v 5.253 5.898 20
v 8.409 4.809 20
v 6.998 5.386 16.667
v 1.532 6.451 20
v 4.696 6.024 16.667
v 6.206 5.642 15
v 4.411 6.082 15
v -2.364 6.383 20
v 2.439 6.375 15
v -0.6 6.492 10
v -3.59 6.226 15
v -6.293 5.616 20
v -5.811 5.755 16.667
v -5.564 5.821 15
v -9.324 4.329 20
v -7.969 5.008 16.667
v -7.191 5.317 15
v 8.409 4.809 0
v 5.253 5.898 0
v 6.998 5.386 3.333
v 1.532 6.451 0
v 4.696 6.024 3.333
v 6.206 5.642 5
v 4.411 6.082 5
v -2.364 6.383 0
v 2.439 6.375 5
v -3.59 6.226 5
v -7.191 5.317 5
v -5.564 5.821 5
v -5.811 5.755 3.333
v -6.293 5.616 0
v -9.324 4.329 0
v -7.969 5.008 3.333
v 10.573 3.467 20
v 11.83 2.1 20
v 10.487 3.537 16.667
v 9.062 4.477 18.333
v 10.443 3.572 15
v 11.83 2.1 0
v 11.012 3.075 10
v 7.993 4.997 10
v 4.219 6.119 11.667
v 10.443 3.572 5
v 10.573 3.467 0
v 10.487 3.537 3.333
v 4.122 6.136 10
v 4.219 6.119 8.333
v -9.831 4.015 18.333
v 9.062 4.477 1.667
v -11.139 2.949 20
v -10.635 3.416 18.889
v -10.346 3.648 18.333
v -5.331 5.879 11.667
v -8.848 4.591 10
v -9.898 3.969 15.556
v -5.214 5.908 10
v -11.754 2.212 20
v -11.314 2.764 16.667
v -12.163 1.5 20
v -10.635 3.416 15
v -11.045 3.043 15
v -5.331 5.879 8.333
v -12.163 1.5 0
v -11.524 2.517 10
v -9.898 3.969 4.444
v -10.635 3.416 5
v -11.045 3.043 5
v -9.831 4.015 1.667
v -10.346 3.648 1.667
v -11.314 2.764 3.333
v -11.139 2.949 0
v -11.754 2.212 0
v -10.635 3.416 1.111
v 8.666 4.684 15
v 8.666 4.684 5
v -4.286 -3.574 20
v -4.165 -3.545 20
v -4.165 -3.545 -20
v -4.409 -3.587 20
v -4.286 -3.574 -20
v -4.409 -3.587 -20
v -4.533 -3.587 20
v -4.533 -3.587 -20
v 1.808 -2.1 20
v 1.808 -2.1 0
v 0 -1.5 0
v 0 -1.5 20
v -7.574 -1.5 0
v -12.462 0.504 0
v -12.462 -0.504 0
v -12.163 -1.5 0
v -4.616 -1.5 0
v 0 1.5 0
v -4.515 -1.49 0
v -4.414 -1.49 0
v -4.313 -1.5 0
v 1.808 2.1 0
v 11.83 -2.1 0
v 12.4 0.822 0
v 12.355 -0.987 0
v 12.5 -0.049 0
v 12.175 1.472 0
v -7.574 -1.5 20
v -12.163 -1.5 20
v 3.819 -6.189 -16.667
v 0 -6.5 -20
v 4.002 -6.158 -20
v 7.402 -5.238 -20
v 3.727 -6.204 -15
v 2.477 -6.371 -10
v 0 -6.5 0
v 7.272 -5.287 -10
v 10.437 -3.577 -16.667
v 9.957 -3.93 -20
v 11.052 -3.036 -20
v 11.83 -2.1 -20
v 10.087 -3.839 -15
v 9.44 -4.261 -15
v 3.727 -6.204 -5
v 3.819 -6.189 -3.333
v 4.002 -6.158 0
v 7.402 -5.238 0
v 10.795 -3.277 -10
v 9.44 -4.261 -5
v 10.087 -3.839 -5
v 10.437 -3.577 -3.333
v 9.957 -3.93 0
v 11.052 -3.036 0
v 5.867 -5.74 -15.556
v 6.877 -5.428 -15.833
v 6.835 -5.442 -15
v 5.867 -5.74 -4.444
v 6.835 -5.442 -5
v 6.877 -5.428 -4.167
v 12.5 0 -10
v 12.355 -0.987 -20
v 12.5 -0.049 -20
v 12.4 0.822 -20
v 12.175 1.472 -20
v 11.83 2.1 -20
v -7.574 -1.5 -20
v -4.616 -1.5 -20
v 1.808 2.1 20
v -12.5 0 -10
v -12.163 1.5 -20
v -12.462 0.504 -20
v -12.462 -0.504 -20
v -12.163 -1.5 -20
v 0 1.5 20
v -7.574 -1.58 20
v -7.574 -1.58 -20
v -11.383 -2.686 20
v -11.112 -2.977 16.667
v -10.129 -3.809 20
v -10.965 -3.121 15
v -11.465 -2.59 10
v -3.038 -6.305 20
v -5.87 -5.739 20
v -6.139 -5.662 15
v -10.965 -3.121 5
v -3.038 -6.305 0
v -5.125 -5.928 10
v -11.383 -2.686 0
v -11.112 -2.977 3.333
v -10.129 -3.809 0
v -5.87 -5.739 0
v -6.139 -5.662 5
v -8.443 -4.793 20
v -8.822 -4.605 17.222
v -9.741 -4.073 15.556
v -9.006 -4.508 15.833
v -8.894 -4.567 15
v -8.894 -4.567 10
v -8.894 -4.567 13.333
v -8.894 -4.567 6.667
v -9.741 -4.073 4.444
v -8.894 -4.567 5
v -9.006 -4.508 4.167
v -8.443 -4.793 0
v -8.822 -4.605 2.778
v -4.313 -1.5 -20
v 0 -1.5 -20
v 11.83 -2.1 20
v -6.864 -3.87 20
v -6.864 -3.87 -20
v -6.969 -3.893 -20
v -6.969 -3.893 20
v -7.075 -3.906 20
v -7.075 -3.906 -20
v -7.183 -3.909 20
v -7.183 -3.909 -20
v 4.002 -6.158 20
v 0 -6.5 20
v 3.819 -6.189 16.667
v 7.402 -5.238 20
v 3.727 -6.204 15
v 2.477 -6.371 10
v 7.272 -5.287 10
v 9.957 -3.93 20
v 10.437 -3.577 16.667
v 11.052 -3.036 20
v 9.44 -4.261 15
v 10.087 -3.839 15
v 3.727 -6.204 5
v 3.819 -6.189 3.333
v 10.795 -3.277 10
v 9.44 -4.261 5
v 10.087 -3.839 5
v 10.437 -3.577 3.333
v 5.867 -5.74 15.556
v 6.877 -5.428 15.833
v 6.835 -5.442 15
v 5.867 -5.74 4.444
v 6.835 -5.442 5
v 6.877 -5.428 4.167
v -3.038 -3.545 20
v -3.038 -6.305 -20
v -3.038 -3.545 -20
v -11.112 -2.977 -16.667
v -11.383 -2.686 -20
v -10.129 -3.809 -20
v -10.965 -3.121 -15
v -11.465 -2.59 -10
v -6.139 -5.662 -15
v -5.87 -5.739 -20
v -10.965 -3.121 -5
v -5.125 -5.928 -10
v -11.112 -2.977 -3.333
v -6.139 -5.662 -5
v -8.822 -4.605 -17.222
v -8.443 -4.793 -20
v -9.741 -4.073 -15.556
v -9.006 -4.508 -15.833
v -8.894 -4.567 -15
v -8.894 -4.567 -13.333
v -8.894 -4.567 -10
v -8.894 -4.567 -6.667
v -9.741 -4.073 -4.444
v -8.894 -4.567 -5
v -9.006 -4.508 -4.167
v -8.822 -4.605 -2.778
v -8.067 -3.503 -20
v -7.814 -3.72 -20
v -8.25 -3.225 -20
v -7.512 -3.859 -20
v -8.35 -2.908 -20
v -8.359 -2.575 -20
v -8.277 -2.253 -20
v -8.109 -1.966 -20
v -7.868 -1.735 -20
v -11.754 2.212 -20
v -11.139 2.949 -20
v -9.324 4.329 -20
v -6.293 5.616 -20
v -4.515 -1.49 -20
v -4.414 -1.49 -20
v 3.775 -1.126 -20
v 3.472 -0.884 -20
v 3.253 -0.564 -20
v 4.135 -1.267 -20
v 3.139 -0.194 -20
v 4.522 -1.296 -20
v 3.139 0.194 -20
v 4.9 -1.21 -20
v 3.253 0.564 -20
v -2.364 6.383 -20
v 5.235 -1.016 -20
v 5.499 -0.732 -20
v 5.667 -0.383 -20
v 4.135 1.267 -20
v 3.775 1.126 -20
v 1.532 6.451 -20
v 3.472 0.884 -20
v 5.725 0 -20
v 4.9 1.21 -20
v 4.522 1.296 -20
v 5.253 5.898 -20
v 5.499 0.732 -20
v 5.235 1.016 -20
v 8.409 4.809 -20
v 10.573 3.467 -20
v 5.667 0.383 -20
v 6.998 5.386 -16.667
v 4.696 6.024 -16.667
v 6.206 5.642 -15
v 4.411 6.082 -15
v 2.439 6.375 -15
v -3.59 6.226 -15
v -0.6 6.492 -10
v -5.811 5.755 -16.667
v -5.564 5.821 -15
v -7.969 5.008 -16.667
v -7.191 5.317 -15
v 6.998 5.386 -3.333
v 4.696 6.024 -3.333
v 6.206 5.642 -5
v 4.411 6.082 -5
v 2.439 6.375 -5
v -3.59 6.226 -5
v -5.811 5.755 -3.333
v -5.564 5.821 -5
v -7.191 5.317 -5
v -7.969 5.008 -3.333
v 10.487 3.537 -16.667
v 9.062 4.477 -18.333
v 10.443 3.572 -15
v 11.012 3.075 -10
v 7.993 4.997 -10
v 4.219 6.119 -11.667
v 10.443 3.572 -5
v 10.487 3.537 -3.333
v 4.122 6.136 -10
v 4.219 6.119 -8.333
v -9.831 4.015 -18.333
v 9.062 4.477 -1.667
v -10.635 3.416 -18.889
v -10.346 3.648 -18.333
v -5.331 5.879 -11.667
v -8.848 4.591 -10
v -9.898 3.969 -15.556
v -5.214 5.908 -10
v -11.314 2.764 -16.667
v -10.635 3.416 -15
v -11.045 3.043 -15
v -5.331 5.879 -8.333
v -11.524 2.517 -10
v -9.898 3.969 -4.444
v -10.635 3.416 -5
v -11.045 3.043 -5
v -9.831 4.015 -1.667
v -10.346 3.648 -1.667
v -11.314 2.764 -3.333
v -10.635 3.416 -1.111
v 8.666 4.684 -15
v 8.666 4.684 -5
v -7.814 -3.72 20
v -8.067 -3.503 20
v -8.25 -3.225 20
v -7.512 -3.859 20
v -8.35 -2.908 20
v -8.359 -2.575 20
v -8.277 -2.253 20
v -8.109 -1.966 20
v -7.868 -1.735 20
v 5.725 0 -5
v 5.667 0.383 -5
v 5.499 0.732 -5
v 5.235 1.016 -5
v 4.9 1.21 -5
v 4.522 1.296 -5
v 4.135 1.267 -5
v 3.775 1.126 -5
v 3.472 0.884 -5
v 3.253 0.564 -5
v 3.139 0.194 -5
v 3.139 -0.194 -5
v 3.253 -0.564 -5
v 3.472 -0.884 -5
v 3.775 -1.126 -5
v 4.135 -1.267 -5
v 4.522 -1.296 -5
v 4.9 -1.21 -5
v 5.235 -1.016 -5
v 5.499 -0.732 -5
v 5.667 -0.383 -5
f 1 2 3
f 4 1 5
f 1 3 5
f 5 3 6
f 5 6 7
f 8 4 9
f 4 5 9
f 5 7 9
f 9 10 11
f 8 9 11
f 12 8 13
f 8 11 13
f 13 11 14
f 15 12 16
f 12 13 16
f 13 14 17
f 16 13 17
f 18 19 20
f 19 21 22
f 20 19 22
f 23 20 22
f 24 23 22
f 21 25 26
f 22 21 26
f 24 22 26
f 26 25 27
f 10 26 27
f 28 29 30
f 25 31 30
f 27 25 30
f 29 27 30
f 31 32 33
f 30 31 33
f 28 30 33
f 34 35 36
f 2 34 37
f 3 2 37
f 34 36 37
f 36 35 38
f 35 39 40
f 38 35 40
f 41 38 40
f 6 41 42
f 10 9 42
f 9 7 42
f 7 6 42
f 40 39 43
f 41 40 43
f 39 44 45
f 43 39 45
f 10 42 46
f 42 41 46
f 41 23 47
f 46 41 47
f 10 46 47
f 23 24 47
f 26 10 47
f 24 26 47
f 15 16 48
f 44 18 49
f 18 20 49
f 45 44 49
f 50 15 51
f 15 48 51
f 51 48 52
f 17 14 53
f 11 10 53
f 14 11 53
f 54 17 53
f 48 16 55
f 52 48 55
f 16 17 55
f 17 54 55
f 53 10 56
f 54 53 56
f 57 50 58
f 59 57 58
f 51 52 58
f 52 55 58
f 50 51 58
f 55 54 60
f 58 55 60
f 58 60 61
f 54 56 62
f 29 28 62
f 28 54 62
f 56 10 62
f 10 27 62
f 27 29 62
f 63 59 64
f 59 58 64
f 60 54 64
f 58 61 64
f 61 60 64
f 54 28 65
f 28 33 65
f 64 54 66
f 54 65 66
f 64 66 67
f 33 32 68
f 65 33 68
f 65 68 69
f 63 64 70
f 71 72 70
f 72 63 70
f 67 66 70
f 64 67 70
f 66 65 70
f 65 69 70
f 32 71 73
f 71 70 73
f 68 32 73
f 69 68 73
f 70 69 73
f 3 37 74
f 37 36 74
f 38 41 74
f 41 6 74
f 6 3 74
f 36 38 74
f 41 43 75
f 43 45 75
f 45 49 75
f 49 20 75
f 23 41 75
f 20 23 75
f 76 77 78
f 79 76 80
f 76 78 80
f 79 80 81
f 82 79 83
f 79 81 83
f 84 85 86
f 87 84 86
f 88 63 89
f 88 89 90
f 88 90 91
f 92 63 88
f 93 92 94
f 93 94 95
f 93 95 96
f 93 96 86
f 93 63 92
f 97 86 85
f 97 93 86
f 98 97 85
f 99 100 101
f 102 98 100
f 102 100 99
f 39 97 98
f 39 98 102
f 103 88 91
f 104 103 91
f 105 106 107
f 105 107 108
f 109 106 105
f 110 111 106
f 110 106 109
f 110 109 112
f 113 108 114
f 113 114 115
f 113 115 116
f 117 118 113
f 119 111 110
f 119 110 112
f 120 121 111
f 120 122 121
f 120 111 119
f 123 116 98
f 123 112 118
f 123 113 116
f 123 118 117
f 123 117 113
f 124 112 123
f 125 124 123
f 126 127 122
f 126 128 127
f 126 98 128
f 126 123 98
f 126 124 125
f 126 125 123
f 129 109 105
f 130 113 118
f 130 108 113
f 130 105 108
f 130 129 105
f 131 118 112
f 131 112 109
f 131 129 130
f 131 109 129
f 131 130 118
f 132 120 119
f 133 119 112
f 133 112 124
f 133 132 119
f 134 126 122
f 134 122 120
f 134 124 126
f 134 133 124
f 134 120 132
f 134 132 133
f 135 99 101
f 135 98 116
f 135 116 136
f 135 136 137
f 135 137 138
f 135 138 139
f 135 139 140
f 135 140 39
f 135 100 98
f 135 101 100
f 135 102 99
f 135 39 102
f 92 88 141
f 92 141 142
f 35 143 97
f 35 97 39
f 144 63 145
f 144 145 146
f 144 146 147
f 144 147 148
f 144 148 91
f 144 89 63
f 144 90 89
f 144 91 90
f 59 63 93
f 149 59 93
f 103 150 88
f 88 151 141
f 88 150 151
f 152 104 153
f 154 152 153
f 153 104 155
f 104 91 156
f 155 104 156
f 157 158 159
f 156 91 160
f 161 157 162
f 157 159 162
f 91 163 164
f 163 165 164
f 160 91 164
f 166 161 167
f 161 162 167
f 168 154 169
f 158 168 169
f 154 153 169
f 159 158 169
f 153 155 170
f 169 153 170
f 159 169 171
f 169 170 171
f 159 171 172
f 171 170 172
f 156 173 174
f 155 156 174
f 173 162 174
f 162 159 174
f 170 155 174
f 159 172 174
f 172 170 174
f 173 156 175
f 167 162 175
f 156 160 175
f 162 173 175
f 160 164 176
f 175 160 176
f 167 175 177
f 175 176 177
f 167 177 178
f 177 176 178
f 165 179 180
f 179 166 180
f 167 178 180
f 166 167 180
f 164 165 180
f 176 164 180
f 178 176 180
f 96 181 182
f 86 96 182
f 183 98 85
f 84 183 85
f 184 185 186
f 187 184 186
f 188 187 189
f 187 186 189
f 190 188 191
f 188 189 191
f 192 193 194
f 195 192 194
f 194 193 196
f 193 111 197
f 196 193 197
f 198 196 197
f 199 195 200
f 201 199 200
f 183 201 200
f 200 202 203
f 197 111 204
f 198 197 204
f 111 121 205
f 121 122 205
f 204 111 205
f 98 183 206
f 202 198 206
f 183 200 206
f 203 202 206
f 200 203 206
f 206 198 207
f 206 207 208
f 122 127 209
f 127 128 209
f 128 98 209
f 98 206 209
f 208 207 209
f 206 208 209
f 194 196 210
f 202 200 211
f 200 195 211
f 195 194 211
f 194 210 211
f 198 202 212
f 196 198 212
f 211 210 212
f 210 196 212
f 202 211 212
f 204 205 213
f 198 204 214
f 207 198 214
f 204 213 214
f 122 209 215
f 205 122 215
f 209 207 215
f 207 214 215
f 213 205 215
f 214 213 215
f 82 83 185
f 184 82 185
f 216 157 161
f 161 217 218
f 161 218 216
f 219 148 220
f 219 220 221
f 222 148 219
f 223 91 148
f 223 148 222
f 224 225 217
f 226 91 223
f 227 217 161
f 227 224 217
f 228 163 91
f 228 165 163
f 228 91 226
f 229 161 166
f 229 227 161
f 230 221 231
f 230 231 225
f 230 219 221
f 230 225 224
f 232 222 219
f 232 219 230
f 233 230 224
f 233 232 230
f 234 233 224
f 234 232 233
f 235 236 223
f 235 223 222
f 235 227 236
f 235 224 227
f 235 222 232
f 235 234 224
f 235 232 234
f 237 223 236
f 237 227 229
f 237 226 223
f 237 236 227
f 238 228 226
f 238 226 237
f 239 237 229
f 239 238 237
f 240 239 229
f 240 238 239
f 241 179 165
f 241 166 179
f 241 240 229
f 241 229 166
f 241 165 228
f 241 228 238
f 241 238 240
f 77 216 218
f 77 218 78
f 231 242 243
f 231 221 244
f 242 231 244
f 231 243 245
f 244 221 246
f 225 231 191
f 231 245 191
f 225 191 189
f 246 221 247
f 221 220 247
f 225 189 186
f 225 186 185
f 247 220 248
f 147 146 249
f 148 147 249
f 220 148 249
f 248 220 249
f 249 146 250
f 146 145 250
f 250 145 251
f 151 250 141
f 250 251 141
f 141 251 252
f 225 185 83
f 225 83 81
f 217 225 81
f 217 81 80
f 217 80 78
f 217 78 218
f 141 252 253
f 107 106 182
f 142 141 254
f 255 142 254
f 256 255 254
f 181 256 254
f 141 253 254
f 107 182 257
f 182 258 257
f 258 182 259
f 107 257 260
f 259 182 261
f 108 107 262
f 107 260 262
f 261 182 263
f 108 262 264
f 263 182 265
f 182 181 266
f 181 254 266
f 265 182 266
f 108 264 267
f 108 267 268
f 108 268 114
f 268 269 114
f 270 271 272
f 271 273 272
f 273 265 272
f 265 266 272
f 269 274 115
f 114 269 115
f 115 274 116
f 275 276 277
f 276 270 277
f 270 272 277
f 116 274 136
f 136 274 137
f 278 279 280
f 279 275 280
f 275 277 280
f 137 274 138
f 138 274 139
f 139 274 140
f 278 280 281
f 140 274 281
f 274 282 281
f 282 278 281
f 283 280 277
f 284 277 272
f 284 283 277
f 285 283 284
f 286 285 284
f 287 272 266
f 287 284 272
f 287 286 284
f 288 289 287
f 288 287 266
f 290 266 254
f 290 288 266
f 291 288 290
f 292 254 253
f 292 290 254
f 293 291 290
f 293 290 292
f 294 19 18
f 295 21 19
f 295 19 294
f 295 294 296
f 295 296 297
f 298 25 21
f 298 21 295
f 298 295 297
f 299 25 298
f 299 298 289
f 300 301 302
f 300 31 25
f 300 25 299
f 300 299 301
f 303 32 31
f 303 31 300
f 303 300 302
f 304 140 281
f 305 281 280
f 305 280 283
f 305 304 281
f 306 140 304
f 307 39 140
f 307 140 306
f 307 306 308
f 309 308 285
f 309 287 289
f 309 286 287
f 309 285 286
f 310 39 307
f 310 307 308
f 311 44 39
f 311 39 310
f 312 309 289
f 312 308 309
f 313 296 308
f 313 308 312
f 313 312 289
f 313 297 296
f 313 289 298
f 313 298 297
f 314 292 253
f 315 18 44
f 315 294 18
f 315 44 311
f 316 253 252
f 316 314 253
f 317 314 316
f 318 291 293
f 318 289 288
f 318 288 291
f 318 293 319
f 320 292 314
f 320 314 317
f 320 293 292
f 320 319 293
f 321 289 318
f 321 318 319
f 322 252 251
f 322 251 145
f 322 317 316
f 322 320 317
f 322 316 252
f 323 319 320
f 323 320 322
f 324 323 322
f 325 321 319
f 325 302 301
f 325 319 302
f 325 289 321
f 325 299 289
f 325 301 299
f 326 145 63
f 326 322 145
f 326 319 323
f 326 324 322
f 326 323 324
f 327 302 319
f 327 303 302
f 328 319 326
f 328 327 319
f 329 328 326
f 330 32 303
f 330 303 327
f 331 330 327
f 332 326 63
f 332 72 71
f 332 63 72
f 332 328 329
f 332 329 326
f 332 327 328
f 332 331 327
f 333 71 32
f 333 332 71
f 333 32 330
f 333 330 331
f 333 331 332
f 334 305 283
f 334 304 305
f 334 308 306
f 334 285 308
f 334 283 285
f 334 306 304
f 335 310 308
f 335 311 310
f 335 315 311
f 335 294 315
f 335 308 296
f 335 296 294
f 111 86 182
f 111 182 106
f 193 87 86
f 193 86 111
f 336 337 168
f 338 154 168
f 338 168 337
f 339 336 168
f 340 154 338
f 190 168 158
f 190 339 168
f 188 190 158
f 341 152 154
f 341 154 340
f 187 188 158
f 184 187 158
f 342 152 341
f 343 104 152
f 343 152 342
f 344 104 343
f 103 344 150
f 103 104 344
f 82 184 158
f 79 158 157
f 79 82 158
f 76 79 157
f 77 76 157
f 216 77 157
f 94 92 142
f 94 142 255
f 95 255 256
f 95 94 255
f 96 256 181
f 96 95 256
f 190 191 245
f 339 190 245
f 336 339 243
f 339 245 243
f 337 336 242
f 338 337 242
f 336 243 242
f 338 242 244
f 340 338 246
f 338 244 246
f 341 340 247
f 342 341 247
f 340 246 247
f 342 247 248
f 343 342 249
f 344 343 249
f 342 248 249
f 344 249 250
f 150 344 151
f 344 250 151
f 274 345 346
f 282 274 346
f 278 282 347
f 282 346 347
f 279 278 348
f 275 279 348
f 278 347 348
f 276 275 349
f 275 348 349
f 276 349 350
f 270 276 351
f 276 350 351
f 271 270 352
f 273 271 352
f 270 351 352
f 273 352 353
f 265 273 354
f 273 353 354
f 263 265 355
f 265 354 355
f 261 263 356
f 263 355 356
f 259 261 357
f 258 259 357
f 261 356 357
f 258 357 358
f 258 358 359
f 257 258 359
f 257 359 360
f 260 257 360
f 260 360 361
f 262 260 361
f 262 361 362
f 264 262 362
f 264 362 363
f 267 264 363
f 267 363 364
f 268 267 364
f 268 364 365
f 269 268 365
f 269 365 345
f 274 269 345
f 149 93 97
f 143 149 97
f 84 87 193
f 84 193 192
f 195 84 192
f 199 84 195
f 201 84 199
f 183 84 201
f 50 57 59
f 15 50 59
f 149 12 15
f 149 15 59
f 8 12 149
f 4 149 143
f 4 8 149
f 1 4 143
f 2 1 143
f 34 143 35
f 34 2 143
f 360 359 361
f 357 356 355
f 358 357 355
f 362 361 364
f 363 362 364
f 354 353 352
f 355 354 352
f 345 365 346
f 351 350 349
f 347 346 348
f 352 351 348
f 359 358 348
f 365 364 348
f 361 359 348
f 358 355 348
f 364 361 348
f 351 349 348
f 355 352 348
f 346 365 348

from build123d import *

# Parameters (mm, degrees)
F0_R     = 1.3
F1_DEPTH = 20
F2_DEPTH = 20
F3_DEPTH = 5


with BuildPart() as f1:
    # F0 (on Top) → F1 (new body)
    with BuildSketch(Plane.XY):
        with BuildLine():
            ThreePointArc((-7.18281, -3.909193), (-8.350454, -2.90793), (-7.573696, -1.580313))
            Line((-7.573696, -1.580313), (-7.573696, -1.5))
            Line((-7.573696, -1.5), (-12.162606, -1.5))
            add(Edge.make_bspline(
                [(-12.162606, -1.5), (-10.40903, -5.344737), (-3.038051, -6.305099)],
                knots=[0.232868, 0.232868, 0.232868, 1.325294, 1.325294, 1.325294], degree=2, weights=[1, 0.854498, 1]))
            Line((-3.038051, -6.305099), (-3.038051, -4.353841))
            Line((-3.038051, -4.353841), (-3.038051, -3.545245))
            Line((-3.038051, -3.545245), (-4.164727, -3.545245))
            ThreePointArc((-4.164727, -3.545245), (-4.346999, -3.582354), (-4.532958, -3.586717))
            Line((-4.532958, -3.586717), (-6.863885, -3.870381))
            ThreePointArc((-6.863885, -3.870381), (-7.022042, -3.900508), (-7.18281, -3.909193))
        make_face()
        with BuildLine():
            Line((-12.162606, -1.5), (-7.573696, -1.5))
            Line((-7.573696, -1.5), (-4.61644, -1.5))
            ThreePointArc((-4.61644, -1.5), (-4.464514, -1.488951), (-4.312587, -1.5))
            Line((-4.312587, -1.5), (0, -1.5))
            Line((0, -1.5), (1.807754, -2.1))
            Line((1.807754, -2.1), (11.829659, -2.1))
            add(Edge.make_bspline(
                [(11.829659, -2.1), (13.208327, 0), (11.829659, 2.1)],
                knots=[2.812614, 2.812614, 2.812614, 3.470572, 3.470572, 3.470572], degree=2, weights=[1, 0.946373, 1]))
            Line((11.829659, 2.1), (1.807754, 2.1))
            Line((1.807754, 2.1), (0, 1.5))
            Line((0, 1.5), (-12.162606, 1.5))
            add(Edge.make_bspline(
                [(-12.162606, 1.5), (-12.5, 0.76026), (-12.5, 0)],
                knots=[6.050317, 6.050317, 6.050317, 6.283185, 6.283185, 6.283185], degree=2, weights=[1, 0.993229, 1]))
            add(Edge.make_bspline(
                [(-12.5, 0), (-12.5, -0.76026), (-12.162606, -1.5)],
                knots=[0, 0, 0, 0.232868, 0.232868, 0.232868], degree=2, weights=[1, 0.993229, 1]))
        make_face()
        with Locations((4.42459, 0)):
            Circle(F0_R, mode=Mode.SUBTRACT)
        with BuildLine():
            add(Edge.make_bspline(
                [(11.829659, 2.1), (-2.165829, 23.418059), (-12.162606, 1.5)],
                knots=[3.470572, 3.470572, 3.470572, 6.050317, 6.050317, 6.050317], degree=2, weights=[1, 0.277243, 1]))
            Line((-12.162606, 1.5), (0, 1.5))
            Line((0, 1.5), (1.807754, 2.1))
            Line((1.807754, 2.1), (11.829659, 2.1))
        make_face()
        with BuildLine():
            Line((0, -1.5), (0, -6.5))
            add(Edge.make_bspline(
                [(0, -6.5), (8.941021, -6.5), (11.829659, -2.1)],
                knots=[1.570796, 1.570796, 1.570796, 2.812614, 2.812614, 2.812614], degree=2, weights=[1, 0.81335, 1]))
            Line((11.829659, -2.1), (1.807754, -2.1))
            Line((1.807754, -2.1), (0, -1.5))
        make_face()
    extrude(amount=-F1_DEPTH)

    # F0 (on Top) → F2 (join)
    with BuildSketch(Plane.XY):
        with BuildLine():
            ThreePointArc((-7.18281, -3.909193), (-8.350454, -2.90793), (-7.573696, -1.580313))
            Line((-7.573696, -1.580313), (-7.573696, -1.5))
            Line((-7.573696, -1.5), (-12.162606, -1.5))
            add(Edge.make_bspline(
                [(-12.162606, -1.5), (-10.40903, -5.344737), (-3.038051, -6.305099)],
                knots=[0.232868, 0.232868, 0.232868, 1.325294, 1.325294, 1.325294], degree=2, weights=[1, 0.854498, 1]))
            Line((-3.038051, -6.305099), (-3.038051, -4.353841))
            Line((-3.038051, -4.353841), (-3.038051, -3.545245))
            Line((-3.038051, -3.545245), (-4.164727, -3.545245))
            ThreePointArc((-4.164727, -3.545245), (-4.346999, -3.582354), (-4.532958, -3.586717))
            Line((-4.532958, -3.586717), (-6.863885, -3.870381))
            ThreePointArc((-6.863885, -3.870381), (-7.022042, -3.900508), (-7.18281, -3.909193))
        make_face()
        with BuildLine():
            add(Edge.make_bspline(
                [(11.829659, 2.1), (-2.165829, 23.418059), (-12.162606, 1.5)],
                knots=[3.470572, 3.470572, 3.470572, 6.050317, 6.050317, 6.050317], degree=2, weights=[1, 0.277243, 1]))
            Line((-12.162606, 1.5), (0, 1.5))
            Line((0, 1.5), (1.807754, 2.1))
            Line((1.807754, 2.1), (11.829659, 2.1))
        make_face()
        with BuildLine():
            Line((0, -1.5), (0, -6.5))
            add(Edge.make_bspline(
                [(0, -6.5), (8.941021, -6.5), (11.829659, -2.1)],
                knots=[1.570796, 1.570796, 1.570796, 2.812614, 2.812614, 2.812614], degree=2, weights=[1, 0.81335, 1]))
            Line((11.829659, -2.1), (1.807754, -2.1))
            Line((1.807754, -2.1), (0, -1.5))
        make_face()
    extrude(amount=F2_DEPTH)

    # F0 (on Top) → F3 (join)
    with BuildSketch(Plane.XY):
        with Locations((4.42459, 0)):
            Circle(F0_R)
    extrude(amount=-F3_DEPTH)


solid = f1.part
